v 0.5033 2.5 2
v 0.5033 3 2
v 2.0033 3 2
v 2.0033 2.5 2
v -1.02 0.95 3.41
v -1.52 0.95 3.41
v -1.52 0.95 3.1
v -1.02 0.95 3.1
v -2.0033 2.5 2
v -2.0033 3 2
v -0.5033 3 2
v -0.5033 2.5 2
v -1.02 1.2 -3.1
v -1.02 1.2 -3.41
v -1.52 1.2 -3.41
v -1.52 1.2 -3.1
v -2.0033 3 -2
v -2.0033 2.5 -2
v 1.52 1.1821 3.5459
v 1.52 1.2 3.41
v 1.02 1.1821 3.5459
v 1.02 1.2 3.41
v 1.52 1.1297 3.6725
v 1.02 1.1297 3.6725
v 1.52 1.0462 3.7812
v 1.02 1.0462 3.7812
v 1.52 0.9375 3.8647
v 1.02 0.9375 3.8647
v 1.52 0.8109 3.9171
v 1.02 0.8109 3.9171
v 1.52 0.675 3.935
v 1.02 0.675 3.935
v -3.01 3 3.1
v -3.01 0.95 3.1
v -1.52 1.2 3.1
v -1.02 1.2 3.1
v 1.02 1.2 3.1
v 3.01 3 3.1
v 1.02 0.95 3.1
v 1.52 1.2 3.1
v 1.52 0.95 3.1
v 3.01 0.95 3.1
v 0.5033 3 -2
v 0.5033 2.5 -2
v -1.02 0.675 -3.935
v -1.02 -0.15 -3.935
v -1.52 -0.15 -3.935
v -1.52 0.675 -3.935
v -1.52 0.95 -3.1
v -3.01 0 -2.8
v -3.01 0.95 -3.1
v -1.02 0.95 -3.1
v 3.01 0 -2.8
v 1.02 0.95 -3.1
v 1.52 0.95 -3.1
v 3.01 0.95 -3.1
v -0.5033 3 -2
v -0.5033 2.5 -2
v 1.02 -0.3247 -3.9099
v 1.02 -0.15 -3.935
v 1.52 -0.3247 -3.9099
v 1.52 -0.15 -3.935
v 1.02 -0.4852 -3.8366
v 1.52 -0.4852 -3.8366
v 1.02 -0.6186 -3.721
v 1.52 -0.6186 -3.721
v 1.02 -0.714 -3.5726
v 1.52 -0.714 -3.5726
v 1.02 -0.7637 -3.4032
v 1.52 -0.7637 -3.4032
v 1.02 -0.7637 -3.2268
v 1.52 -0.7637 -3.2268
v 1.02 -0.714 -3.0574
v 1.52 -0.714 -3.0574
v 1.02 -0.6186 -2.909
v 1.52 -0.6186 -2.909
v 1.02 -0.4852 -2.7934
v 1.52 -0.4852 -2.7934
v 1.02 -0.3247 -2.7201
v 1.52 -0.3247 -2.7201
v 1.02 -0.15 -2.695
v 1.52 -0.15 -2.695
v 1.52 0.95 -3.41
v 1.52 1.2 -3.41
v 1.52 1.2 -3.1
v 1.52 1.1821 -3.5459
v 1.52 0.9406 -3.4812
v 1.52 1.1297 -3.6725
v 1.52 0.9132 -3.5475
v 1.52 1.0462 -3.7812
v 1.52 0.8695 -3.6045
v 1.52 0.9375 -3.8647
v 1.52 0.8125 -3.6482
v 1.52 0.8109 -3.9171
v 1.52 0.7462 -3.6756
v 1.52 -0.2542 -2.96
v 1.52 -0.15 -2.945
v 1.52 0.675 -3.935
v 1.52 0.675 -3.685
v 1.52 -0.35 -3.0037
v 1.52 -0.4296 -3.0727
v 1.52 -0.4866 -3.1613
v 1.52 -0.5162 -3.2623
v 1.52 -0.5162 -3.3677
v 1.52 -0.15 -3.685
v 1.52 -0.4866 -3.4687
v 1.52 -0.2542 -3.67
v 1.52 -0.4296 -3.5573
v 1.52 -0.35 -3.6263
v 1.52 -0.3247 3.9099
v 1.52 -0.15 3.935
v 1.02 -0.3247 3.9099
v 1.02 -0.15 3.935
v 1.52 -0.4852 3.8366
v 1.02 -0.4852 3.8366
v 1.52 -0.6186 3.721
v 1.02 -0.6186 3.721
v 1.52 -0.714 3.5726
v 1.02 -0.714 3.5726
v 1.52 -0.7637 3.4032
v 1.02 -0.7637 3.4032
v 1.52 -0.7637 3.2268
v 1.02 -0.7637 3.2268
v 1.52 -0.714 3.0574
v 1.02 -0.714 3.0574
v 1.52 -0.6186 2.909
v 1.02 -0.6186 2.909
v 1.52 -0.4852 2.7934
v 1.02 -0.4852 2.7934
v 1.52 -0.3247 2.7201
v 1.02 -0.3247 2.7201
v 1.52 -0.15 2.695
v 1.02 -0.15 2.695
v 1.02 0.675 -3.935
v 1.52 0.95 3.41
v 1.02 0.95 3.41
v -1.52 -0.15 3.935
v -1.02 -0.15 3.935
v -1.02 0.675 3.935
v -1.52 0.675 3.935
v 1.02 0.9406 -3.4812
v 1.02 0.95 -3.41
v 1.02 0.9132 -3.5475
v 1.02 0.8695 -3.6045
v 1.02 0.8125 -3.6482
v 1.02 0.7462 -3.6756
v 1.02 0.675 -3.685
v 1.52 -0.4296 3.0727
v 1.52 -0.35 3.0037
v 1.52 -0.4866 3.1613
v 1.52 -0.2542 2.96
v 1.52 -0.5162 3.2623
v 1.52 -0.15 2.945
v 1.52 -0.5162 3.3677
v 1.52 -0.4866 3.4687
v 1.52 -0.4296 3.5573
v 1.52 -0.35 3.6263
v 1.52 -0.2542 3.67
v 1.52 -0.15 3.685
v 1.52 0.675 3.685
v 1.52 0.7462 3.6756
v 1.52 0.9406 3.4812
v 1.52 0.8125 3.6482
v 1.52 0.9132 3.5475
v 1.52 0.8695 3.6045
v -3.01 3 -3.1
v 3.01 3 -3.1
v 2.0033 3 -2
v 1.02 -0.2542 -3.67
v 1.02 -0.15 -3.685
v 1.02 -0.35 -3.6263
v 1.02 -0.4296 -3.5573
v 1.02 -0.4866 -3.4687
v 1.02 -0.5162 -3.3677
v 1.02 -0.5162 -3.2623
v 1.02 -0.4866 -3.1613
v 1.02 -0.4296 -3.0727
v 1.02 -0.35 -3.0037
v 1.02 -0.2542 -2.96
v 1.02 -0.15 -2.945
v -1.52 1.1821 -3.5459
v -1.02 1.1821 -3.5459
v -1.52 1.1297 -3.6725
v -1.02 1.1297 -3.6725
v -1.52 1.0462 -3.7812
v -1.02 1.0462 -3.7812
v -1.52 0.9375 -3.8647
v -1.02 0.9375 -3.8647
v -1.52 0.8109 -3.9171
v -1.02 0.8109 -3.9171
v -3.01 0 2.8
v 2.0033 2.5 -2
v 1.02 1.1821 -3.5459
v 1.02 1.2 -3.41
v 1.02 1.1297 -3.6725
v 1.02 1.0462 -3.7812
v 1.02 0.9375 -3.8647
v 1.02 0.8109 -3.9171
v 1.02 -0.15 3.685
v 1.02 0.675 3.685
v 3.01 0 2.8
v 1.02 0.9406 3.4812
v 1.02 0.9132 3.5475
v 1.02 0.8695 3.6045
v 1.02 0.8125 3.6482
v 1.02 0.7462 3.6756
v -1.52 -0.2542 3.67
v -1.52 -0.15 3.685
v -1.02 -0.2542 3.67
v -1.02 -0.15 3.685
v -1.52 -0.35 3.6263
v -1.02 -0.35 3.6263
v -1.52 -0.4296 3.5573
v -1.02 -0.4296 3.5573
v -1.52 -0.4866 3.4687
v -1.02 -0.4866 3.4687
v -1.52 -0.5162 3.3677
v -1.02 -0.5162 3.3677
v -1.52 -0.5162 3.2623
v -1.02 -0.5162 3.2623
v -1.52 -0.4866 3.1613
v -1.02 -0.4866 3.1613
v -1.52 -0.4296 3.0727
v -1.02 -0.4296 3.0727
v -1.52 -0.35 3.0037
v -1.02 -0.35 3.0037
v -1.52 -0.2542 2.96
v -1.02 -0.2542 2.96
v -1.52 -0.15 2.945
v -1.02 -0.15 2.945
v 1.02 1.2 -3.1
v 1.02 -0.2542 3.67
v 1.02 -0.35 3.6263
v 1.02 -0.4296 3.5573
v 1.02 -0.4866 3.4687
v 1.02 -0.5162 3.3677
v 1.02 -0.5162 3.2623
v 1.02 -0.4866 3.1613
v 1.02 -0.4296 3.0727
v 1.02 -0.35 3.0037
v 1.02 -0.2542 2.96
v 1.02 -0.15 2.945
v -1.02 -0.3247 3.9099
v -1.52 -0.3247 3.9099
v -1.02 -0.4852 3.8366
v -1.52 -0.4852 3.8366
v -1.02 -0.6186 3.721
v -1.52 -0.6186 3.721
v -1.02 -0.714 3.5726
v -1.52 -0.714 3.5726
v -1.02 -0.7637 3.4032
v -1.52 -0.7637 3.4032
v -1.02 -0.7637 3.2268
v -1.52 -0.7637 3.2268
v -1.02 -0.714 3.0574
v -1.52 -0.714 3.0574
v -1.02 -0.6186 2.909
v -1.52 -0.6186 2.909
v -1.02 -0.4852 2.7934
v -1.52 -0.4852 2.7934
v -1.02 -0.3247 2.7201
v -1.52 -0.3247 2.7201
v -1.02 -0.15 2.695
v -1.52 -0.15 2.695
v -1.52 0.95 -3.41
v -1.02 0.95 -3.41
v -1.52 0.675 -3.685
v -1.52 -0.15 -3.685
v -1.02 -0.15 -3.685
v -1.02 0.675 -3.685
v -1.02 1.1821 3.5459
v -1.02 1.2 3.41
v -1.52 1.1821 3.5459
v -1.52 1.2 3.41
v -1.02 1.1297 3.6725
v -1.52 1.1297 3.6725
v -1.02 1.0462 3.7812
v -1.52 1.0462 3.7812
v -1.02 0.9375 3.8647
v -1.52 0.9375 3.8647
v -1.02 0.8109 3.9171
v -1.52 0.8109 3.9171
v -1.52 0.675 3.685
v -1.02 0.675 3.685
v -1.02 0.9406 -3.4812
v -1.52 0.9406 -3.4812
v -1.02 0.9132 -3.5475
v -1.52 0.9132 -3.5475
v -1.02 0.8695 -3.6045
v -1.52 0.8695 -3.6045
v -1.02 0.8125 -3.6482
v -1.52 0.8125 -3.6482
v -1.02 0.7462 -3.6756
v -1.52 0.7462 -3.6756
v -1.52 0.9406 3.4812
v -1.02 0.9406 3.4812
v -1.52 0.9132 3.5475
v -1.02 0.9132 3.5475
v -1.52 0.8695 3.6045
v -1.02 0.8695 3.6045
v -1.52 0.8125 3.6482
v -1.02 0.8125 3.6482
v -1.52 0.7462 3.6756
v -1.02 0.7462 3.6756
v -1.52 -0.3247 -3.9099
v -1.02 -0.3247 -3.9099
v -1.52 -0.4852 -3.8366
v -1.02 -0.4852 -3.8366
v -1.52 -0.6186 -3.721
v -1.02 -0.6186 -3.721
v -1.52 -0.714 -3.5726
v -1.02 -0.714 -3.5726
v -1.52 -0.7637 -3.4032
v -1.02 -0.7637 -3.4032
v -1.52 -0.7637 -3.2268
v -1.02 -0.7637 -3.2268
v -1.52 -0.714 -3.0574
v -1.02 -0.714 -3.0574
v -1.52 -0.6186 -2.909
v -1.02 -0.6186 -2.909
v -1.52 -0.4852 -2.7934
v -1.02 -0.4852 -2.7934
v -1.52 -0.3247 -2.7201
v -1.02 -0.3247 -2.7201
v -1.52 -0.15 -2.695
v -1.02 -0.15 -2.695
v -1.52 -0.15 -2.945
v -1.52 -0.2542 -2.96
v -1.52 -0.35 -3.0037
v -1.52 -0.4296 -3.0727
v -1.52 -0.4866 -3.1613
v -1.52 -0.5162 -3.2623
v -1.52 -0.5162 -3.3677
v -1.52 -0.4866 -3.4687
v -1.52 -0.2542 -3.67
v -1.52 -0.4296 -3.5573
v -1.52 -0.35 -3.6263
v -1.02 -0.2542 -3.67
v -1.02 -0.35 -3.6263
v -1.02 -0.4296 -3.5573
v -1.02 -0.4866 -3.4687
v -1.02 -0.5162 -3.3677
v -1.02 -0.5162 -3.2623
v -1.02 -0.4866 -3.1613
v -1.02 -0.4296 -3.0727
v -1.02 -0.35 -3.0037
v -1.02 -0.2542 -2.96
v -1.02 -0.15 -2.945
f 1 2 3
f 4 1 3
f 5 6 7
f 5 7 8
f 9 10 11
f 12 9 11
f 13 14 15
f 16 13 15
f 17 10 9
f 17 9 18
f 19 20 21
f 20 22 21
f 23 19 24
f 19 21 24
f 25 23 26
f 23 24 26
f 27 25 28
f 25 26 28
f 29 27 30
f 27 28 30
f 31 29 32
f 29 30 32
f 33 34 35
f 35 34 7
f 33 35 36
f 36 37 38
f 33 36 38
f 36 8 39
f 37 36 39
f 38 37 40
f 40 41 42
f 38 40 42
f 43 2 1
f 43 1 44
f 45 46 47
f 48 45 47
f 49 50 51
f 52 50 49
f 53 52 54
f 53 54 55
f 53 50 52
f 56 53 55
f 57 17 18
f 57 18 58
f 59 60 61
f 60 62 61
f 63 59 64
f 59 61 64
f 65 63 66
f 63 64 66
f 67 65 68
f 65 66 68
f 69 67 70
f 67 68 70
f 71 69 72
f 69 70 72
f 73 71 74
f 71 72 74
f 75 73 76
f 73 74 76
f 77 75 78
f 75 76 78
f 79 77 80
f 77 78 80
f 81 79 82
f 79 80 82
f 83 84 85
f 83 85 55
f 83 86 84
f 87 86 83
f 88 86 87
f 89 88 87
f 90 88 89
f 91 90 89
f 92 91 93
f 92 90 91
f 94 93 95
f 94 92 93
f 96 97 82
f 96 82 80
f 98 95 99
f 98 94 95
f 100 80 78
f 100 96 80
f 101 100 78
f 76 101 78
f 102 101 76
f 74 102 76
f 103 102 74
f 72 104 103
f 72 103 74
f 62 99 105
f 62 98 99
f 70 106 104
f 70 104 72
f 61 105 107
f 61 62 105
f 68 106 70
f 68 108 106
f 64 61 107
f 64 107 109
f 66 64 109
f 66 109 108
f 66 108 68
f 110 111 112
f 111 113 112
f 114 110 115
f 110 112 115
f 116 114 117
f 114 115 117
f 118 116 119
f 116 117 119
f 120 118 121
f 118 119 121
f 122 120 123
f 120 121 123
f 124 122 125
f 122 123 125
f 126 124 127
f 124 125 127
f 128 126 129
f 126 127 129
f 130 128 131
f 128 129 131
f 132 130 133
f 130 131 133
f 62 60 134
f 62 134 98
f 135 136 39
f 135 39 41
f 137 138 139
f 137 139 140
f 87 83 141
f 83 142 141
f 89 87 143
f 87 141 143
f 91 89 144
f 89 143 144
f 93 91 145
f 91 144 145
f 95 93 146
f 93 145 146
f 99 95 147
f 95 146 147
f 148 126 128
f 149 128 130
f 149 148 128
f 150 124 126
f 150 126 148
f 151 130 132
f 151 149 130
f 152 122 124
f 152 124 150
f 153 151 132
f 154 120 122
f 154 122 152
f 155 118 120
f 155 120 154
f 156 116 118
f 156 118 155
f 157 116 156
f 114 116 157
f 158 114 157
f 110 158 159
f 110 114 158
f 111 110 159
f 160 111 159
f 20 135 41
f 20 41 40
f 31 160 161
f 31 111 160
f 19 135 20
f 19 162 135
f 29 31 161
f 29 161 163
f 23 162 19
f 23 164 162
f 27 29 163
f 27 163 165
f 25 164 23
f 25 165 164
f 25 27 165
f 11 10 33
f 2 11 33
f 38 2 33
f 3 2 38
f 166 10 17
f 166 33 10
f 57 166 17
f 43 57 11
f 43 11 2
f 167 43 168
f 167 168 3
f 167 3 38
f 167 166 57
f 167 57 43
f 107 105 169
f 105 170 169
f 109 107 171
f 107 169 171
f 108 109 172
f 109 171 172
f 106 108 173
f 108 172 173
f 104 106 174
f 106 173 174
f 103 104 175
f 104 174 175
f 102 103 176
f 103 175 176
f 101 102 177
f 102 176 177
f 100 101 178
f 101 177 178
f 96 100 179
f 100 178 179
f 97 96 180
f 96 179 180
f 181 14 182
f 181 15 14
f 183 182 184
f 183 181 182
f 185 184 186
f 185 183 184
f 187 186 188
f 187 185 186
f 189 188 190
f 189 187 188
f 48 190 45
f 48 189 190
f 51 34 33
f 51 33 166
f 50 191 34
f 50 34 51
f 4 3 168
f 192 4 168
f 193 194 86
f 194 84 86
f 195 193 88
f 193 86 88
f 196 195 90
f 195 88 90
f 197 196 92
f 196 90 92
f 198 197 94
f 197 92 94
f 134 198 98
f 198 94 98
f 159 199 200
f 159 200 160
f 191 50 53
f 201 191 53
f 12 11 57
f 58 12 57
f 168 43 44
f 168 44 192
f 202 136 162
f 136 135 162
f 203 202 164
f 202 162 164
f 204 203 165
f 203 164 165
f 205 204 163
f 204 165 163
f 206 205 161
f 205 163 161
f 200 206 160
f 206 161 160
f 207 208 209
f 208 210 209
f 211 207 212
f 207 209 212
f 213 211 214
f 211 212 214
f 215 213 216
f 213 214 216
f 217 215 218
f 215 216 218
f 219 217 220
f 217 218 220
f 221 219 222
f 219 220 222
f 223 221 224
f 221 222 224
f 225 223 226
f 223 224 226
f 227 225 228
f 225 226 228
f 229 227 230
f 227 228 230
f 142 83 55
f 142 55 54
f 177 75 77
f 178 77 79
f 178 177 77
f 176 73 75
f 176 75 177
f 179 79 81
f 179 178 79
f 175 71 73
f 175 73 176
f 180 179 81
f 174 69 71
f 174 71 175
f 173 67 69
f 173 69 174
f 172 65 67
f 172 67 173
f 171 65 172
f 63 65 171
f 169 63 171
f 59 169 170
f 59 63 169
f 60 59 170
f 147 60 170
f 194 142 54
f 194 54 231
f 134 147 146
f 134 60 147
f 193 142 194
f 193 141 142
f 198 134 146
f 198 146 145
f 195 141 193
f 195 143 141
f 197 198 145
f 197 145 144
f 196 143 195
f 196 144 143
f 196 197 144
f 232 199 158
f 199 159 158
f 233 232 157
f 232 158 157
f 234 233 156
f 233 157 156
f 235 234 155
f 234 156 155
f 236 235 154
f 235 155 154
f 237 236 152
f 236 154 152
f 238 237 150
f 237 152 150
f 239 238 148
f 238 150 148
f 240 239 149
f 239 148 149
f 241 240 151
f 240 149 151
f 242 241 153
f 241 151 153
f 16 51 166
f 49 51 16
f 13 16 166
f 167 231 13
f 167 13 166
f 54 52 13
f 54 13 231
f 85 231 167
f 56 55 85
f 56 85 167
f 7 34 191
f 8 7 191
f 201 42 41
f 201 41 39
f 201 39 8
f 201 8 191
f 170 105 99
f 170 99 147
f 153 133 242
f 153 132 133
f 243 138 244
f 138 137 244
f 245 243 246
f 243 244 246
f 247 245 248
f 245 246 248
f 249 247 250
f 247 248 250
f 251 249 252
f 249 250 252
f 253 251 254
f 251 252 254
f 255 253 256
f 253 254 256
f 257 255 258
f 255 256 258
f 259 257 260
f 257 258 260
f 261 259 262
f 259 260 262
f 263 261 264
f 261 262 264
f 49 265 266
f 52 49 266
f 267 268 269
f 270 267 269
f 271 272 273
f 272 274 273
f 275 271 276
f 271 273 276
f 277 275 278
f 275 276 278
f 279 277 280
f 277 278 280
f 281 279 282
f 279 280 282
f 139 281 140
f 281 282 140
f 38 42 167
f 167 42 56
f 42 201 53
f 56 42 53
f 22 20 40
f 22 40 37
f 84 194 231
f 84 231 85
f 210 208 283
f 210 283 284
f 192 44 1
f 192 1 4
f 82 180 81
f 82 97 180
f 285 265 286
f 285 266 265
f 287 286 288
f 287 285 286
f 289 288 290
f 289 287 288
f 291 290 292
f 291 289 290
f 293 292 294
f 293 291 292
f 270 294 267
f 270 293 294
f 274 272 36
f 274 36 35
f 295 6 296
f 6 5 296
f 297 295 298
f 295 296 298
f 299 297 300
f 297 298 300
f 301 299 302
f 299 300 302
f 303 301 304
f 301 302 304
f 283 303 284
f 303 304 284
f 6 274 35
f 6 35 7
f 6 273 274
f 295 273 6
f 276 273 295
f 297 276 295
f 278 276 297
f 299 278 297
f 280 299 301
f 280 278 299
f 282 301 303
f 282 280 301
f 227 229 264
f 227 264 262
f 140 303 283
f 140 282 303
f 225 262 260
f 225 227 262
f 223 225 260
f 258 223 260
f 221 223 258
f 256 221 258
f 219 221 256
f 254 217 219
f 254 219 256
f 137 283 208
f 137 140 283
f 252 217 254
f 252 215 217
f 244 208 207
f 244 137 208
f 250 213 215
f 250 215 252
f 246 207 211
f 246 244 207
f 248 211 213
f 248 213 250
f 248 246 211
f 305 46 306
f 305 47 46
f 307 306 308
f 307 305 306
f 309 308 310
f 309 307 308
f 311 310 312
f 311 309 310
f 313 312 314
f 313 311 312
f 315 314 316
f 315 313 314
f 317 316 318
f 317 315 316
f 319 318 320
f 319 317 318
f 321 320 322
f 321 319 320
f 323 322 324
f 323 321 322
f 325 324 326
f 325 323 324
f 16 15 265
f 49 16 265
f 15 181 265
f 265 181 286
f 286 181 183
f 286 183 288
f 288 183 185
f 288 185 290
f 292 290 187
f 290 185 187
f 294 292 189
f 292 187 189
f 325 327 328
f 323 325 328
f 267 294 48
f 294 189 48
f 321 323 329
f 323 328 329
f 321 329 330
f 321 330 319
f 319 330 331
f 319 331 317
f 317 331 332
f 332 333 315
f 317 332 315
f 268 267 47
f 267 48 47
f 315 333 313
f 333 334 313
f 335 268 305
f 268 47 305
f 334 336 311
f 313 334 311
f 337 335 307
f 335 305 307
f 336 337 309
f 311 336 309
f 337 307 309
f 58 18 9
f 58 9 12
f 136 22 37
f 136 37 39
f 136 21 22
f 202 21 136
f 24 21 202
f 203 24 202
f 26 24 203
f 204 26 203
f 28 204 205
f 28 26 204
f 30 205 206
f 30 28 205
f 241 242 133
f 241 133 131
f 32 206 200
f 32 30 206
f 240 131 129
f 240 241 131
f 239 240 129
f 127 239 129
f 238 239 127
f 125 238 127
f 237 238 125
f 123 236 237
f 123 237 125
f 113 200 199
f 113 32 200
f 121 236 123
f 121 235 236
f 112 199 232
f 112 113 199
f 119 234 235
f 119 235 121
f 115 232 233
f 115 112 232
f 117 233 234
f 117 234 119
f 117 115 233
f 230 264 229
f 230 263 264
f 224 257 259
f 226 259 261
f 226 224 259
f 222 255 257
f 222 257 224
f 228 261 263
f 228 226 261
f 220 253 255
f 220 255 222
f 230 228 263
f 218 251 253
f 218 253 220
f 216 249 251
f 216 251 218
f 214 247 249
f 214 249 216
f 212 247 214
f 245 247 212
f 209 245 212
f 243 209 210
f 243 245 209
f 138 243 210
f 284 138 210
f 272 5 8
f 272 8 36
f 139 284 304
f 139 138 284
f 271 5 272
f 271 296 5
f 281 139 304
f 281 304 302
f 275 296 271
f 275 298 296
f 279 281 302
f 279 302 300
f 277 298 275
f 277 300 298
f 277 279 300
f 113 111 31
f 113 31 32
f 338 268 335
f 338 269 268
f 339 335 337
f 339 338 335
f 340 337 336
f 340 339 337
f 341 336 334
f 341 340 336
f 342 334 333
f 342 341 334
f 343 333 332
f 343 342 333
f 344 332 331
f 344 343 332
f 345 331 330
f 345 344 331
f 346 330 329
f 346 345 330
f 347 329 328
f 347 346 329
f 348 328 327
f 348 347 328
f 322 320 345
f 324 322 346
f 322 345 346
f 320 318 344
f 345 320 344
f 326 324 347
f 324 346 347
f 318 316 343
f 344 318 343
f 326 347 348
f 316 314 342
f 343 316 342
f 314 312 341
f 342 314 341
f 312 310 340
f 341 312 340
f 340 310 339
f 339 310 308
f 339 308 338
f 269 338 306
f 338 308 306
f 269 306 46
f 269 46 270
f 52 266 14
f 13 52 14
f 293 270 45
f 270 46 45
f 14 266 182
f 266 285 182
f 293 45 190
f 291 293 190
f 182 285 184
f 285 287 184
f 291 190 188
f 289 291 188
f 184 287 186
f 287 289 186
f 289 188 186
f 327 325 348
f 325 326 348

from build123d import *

# Parameters (mm, degrees)
SKETCH_3_W               = 6.02
SKETCH_3_H               = 6.2
EXTRUDE_1_DEPTH          = 3
SKETCH_4_W               = 1.5
SKETCH_4_H               = 4
CUT_EXTRUDE_1_DEPTH      = 0.5
CUT_EXTRUDE_2_DEPTH      = 8.406105589
SKETCH_6_W               = 0.5
SKETCH_6_H               = 0.25
PATTERN_LINEAR_1_COUNT   = 2
PATTERN_LINEAR_1_PITCH   = 2.54
MIRROR_1_COPY_1_SKETCH_W = 0.5
MIRROR_1_COPY_1_SKETCH_H = 0.25


with BuildPart() as part:
    # Эскиз3 → Бобышка-Вытянуть1 (new body)
    with BuildSketch(Plane(origin=(0, 0, 0), x_dir=(1, 0, 0), z_dir=(0, 1, 0))):
        Rectangle(SKETCH_3_W, SKETCH_3_H)
    extrude(amount=EXTRUDE_1_DEPTH)

    # Эскиз4 → Вырез-Вытянуть1 (cut)
    with BuildSketch(Plane(origin=(0, 3, 0), x_dir=(1, 0, 0), z_dir=(0, 1, 0))):
        with Locations((-1.253333333, 0)):
            Rectangle(SKETCH_4_W, SKETCH_4_H)
        with Locations((1.253333333, 0)):
            Rectangle(SKETCH_4_W, SKETCH_4_H)
    extrude(amount=-CUT_EXTRUDE_1_DEPTH, mode=Mode.SUBTRACT)

    # Эскиз5 → Вырез-Вытянуть2 (cut, through all)
    with BuildSketch(Plane(origin=(3.01, 0, 0), x_dir=(0, 0, -1), z_dir=(1, 0, 0))):
        Polygon((-3.1, 0.95), (-2.8, 0), (-3.1, 0), align=None)
        Polygon((3.1, 0), (2.8, 0), (3.1, 0.95), align=None)
    extrude(amount=-CUT_EXTRUDE_2_DEPTH, mode=Mode.SUBTRACT)

    # По траектории1: sweep along a curve in space
    with BuildLine() as sweep_1_path:
        Line((-1.27, 1.075, 3.1), (-1.27, 1.075, 3.41))
        ThreePointArc((-1.27, 1.075, 3.41), (-1.27, 0.957842712, 3.692842712), (-1.27, 0.675, 3.81))
        Line((-1.27, 0.675, 3.81), (-1.27, -0.15, 3.81))
        ThreePointArc((-1.27, -0.15, 3.81), (-1.27, -0.645, 3.315), (-1.27, -0.15, 2.82))
    # Эскиз6 → По траектории1 (sweep)
    with BuildSketch(Plane.XY.offset(3.1)):
        with Locations((-1.27, 1.075)):
            Rectangle(SKETCH_6_W, SKETCH_6_H)
    sweep_1 = sweep(path=sweep_1_path.line)

    # Линейный массив1: По траектории1 ×2
    with Locations(*[(i * PATTERN_LINEAR_1_PITCH, 0, 0) for i in range(1, PATTERN_LINEAR_1_COUNT)]):
        add(sweep_1)

    # Зеркальное отражение1: По траектории1 across plane
    add(sweep_1.mirror(Plane.XY))

    # Зеркальное отражение1 copy 1: sweep along a curve in space
    with BuildLine() as mirror_1_copy_1_path:
        Line((1.27, 1.075, -3.1), (1.27, 1.075, -3.41))
        ThreePointArc((1.27, 1.075, -3.41), (1.27, 0.957842712, -3.692842712), (1.27, 0.675, -3.81))
        Line((1.27, 0.675, -3.81), (1.27, -0.15, -3.81))
        ThreePointArc((1.27, -0.15, -3.81), (1.27, -0.645, -3.315), (1.27, -0.15, -2.82))
    # Зеркальное отражение1 copy 1 sketch → Зеркальное отражение1 copy 1 (sweep)
    with BuildSketch(Plane(origin=(2.54, 0, -3.1), x_dir=(1, 0, 0), z_dir=(0, 0, -1))):
        with Locations((-1.27, -1.075)):
            Rectangle(MIRROR_1_COPY_1_SKETCH_W, MIRROR_1_COPY_1_SKETCH_H)
    sweep(path=mirror_1_copy_1_path.line)


solid = part.part
